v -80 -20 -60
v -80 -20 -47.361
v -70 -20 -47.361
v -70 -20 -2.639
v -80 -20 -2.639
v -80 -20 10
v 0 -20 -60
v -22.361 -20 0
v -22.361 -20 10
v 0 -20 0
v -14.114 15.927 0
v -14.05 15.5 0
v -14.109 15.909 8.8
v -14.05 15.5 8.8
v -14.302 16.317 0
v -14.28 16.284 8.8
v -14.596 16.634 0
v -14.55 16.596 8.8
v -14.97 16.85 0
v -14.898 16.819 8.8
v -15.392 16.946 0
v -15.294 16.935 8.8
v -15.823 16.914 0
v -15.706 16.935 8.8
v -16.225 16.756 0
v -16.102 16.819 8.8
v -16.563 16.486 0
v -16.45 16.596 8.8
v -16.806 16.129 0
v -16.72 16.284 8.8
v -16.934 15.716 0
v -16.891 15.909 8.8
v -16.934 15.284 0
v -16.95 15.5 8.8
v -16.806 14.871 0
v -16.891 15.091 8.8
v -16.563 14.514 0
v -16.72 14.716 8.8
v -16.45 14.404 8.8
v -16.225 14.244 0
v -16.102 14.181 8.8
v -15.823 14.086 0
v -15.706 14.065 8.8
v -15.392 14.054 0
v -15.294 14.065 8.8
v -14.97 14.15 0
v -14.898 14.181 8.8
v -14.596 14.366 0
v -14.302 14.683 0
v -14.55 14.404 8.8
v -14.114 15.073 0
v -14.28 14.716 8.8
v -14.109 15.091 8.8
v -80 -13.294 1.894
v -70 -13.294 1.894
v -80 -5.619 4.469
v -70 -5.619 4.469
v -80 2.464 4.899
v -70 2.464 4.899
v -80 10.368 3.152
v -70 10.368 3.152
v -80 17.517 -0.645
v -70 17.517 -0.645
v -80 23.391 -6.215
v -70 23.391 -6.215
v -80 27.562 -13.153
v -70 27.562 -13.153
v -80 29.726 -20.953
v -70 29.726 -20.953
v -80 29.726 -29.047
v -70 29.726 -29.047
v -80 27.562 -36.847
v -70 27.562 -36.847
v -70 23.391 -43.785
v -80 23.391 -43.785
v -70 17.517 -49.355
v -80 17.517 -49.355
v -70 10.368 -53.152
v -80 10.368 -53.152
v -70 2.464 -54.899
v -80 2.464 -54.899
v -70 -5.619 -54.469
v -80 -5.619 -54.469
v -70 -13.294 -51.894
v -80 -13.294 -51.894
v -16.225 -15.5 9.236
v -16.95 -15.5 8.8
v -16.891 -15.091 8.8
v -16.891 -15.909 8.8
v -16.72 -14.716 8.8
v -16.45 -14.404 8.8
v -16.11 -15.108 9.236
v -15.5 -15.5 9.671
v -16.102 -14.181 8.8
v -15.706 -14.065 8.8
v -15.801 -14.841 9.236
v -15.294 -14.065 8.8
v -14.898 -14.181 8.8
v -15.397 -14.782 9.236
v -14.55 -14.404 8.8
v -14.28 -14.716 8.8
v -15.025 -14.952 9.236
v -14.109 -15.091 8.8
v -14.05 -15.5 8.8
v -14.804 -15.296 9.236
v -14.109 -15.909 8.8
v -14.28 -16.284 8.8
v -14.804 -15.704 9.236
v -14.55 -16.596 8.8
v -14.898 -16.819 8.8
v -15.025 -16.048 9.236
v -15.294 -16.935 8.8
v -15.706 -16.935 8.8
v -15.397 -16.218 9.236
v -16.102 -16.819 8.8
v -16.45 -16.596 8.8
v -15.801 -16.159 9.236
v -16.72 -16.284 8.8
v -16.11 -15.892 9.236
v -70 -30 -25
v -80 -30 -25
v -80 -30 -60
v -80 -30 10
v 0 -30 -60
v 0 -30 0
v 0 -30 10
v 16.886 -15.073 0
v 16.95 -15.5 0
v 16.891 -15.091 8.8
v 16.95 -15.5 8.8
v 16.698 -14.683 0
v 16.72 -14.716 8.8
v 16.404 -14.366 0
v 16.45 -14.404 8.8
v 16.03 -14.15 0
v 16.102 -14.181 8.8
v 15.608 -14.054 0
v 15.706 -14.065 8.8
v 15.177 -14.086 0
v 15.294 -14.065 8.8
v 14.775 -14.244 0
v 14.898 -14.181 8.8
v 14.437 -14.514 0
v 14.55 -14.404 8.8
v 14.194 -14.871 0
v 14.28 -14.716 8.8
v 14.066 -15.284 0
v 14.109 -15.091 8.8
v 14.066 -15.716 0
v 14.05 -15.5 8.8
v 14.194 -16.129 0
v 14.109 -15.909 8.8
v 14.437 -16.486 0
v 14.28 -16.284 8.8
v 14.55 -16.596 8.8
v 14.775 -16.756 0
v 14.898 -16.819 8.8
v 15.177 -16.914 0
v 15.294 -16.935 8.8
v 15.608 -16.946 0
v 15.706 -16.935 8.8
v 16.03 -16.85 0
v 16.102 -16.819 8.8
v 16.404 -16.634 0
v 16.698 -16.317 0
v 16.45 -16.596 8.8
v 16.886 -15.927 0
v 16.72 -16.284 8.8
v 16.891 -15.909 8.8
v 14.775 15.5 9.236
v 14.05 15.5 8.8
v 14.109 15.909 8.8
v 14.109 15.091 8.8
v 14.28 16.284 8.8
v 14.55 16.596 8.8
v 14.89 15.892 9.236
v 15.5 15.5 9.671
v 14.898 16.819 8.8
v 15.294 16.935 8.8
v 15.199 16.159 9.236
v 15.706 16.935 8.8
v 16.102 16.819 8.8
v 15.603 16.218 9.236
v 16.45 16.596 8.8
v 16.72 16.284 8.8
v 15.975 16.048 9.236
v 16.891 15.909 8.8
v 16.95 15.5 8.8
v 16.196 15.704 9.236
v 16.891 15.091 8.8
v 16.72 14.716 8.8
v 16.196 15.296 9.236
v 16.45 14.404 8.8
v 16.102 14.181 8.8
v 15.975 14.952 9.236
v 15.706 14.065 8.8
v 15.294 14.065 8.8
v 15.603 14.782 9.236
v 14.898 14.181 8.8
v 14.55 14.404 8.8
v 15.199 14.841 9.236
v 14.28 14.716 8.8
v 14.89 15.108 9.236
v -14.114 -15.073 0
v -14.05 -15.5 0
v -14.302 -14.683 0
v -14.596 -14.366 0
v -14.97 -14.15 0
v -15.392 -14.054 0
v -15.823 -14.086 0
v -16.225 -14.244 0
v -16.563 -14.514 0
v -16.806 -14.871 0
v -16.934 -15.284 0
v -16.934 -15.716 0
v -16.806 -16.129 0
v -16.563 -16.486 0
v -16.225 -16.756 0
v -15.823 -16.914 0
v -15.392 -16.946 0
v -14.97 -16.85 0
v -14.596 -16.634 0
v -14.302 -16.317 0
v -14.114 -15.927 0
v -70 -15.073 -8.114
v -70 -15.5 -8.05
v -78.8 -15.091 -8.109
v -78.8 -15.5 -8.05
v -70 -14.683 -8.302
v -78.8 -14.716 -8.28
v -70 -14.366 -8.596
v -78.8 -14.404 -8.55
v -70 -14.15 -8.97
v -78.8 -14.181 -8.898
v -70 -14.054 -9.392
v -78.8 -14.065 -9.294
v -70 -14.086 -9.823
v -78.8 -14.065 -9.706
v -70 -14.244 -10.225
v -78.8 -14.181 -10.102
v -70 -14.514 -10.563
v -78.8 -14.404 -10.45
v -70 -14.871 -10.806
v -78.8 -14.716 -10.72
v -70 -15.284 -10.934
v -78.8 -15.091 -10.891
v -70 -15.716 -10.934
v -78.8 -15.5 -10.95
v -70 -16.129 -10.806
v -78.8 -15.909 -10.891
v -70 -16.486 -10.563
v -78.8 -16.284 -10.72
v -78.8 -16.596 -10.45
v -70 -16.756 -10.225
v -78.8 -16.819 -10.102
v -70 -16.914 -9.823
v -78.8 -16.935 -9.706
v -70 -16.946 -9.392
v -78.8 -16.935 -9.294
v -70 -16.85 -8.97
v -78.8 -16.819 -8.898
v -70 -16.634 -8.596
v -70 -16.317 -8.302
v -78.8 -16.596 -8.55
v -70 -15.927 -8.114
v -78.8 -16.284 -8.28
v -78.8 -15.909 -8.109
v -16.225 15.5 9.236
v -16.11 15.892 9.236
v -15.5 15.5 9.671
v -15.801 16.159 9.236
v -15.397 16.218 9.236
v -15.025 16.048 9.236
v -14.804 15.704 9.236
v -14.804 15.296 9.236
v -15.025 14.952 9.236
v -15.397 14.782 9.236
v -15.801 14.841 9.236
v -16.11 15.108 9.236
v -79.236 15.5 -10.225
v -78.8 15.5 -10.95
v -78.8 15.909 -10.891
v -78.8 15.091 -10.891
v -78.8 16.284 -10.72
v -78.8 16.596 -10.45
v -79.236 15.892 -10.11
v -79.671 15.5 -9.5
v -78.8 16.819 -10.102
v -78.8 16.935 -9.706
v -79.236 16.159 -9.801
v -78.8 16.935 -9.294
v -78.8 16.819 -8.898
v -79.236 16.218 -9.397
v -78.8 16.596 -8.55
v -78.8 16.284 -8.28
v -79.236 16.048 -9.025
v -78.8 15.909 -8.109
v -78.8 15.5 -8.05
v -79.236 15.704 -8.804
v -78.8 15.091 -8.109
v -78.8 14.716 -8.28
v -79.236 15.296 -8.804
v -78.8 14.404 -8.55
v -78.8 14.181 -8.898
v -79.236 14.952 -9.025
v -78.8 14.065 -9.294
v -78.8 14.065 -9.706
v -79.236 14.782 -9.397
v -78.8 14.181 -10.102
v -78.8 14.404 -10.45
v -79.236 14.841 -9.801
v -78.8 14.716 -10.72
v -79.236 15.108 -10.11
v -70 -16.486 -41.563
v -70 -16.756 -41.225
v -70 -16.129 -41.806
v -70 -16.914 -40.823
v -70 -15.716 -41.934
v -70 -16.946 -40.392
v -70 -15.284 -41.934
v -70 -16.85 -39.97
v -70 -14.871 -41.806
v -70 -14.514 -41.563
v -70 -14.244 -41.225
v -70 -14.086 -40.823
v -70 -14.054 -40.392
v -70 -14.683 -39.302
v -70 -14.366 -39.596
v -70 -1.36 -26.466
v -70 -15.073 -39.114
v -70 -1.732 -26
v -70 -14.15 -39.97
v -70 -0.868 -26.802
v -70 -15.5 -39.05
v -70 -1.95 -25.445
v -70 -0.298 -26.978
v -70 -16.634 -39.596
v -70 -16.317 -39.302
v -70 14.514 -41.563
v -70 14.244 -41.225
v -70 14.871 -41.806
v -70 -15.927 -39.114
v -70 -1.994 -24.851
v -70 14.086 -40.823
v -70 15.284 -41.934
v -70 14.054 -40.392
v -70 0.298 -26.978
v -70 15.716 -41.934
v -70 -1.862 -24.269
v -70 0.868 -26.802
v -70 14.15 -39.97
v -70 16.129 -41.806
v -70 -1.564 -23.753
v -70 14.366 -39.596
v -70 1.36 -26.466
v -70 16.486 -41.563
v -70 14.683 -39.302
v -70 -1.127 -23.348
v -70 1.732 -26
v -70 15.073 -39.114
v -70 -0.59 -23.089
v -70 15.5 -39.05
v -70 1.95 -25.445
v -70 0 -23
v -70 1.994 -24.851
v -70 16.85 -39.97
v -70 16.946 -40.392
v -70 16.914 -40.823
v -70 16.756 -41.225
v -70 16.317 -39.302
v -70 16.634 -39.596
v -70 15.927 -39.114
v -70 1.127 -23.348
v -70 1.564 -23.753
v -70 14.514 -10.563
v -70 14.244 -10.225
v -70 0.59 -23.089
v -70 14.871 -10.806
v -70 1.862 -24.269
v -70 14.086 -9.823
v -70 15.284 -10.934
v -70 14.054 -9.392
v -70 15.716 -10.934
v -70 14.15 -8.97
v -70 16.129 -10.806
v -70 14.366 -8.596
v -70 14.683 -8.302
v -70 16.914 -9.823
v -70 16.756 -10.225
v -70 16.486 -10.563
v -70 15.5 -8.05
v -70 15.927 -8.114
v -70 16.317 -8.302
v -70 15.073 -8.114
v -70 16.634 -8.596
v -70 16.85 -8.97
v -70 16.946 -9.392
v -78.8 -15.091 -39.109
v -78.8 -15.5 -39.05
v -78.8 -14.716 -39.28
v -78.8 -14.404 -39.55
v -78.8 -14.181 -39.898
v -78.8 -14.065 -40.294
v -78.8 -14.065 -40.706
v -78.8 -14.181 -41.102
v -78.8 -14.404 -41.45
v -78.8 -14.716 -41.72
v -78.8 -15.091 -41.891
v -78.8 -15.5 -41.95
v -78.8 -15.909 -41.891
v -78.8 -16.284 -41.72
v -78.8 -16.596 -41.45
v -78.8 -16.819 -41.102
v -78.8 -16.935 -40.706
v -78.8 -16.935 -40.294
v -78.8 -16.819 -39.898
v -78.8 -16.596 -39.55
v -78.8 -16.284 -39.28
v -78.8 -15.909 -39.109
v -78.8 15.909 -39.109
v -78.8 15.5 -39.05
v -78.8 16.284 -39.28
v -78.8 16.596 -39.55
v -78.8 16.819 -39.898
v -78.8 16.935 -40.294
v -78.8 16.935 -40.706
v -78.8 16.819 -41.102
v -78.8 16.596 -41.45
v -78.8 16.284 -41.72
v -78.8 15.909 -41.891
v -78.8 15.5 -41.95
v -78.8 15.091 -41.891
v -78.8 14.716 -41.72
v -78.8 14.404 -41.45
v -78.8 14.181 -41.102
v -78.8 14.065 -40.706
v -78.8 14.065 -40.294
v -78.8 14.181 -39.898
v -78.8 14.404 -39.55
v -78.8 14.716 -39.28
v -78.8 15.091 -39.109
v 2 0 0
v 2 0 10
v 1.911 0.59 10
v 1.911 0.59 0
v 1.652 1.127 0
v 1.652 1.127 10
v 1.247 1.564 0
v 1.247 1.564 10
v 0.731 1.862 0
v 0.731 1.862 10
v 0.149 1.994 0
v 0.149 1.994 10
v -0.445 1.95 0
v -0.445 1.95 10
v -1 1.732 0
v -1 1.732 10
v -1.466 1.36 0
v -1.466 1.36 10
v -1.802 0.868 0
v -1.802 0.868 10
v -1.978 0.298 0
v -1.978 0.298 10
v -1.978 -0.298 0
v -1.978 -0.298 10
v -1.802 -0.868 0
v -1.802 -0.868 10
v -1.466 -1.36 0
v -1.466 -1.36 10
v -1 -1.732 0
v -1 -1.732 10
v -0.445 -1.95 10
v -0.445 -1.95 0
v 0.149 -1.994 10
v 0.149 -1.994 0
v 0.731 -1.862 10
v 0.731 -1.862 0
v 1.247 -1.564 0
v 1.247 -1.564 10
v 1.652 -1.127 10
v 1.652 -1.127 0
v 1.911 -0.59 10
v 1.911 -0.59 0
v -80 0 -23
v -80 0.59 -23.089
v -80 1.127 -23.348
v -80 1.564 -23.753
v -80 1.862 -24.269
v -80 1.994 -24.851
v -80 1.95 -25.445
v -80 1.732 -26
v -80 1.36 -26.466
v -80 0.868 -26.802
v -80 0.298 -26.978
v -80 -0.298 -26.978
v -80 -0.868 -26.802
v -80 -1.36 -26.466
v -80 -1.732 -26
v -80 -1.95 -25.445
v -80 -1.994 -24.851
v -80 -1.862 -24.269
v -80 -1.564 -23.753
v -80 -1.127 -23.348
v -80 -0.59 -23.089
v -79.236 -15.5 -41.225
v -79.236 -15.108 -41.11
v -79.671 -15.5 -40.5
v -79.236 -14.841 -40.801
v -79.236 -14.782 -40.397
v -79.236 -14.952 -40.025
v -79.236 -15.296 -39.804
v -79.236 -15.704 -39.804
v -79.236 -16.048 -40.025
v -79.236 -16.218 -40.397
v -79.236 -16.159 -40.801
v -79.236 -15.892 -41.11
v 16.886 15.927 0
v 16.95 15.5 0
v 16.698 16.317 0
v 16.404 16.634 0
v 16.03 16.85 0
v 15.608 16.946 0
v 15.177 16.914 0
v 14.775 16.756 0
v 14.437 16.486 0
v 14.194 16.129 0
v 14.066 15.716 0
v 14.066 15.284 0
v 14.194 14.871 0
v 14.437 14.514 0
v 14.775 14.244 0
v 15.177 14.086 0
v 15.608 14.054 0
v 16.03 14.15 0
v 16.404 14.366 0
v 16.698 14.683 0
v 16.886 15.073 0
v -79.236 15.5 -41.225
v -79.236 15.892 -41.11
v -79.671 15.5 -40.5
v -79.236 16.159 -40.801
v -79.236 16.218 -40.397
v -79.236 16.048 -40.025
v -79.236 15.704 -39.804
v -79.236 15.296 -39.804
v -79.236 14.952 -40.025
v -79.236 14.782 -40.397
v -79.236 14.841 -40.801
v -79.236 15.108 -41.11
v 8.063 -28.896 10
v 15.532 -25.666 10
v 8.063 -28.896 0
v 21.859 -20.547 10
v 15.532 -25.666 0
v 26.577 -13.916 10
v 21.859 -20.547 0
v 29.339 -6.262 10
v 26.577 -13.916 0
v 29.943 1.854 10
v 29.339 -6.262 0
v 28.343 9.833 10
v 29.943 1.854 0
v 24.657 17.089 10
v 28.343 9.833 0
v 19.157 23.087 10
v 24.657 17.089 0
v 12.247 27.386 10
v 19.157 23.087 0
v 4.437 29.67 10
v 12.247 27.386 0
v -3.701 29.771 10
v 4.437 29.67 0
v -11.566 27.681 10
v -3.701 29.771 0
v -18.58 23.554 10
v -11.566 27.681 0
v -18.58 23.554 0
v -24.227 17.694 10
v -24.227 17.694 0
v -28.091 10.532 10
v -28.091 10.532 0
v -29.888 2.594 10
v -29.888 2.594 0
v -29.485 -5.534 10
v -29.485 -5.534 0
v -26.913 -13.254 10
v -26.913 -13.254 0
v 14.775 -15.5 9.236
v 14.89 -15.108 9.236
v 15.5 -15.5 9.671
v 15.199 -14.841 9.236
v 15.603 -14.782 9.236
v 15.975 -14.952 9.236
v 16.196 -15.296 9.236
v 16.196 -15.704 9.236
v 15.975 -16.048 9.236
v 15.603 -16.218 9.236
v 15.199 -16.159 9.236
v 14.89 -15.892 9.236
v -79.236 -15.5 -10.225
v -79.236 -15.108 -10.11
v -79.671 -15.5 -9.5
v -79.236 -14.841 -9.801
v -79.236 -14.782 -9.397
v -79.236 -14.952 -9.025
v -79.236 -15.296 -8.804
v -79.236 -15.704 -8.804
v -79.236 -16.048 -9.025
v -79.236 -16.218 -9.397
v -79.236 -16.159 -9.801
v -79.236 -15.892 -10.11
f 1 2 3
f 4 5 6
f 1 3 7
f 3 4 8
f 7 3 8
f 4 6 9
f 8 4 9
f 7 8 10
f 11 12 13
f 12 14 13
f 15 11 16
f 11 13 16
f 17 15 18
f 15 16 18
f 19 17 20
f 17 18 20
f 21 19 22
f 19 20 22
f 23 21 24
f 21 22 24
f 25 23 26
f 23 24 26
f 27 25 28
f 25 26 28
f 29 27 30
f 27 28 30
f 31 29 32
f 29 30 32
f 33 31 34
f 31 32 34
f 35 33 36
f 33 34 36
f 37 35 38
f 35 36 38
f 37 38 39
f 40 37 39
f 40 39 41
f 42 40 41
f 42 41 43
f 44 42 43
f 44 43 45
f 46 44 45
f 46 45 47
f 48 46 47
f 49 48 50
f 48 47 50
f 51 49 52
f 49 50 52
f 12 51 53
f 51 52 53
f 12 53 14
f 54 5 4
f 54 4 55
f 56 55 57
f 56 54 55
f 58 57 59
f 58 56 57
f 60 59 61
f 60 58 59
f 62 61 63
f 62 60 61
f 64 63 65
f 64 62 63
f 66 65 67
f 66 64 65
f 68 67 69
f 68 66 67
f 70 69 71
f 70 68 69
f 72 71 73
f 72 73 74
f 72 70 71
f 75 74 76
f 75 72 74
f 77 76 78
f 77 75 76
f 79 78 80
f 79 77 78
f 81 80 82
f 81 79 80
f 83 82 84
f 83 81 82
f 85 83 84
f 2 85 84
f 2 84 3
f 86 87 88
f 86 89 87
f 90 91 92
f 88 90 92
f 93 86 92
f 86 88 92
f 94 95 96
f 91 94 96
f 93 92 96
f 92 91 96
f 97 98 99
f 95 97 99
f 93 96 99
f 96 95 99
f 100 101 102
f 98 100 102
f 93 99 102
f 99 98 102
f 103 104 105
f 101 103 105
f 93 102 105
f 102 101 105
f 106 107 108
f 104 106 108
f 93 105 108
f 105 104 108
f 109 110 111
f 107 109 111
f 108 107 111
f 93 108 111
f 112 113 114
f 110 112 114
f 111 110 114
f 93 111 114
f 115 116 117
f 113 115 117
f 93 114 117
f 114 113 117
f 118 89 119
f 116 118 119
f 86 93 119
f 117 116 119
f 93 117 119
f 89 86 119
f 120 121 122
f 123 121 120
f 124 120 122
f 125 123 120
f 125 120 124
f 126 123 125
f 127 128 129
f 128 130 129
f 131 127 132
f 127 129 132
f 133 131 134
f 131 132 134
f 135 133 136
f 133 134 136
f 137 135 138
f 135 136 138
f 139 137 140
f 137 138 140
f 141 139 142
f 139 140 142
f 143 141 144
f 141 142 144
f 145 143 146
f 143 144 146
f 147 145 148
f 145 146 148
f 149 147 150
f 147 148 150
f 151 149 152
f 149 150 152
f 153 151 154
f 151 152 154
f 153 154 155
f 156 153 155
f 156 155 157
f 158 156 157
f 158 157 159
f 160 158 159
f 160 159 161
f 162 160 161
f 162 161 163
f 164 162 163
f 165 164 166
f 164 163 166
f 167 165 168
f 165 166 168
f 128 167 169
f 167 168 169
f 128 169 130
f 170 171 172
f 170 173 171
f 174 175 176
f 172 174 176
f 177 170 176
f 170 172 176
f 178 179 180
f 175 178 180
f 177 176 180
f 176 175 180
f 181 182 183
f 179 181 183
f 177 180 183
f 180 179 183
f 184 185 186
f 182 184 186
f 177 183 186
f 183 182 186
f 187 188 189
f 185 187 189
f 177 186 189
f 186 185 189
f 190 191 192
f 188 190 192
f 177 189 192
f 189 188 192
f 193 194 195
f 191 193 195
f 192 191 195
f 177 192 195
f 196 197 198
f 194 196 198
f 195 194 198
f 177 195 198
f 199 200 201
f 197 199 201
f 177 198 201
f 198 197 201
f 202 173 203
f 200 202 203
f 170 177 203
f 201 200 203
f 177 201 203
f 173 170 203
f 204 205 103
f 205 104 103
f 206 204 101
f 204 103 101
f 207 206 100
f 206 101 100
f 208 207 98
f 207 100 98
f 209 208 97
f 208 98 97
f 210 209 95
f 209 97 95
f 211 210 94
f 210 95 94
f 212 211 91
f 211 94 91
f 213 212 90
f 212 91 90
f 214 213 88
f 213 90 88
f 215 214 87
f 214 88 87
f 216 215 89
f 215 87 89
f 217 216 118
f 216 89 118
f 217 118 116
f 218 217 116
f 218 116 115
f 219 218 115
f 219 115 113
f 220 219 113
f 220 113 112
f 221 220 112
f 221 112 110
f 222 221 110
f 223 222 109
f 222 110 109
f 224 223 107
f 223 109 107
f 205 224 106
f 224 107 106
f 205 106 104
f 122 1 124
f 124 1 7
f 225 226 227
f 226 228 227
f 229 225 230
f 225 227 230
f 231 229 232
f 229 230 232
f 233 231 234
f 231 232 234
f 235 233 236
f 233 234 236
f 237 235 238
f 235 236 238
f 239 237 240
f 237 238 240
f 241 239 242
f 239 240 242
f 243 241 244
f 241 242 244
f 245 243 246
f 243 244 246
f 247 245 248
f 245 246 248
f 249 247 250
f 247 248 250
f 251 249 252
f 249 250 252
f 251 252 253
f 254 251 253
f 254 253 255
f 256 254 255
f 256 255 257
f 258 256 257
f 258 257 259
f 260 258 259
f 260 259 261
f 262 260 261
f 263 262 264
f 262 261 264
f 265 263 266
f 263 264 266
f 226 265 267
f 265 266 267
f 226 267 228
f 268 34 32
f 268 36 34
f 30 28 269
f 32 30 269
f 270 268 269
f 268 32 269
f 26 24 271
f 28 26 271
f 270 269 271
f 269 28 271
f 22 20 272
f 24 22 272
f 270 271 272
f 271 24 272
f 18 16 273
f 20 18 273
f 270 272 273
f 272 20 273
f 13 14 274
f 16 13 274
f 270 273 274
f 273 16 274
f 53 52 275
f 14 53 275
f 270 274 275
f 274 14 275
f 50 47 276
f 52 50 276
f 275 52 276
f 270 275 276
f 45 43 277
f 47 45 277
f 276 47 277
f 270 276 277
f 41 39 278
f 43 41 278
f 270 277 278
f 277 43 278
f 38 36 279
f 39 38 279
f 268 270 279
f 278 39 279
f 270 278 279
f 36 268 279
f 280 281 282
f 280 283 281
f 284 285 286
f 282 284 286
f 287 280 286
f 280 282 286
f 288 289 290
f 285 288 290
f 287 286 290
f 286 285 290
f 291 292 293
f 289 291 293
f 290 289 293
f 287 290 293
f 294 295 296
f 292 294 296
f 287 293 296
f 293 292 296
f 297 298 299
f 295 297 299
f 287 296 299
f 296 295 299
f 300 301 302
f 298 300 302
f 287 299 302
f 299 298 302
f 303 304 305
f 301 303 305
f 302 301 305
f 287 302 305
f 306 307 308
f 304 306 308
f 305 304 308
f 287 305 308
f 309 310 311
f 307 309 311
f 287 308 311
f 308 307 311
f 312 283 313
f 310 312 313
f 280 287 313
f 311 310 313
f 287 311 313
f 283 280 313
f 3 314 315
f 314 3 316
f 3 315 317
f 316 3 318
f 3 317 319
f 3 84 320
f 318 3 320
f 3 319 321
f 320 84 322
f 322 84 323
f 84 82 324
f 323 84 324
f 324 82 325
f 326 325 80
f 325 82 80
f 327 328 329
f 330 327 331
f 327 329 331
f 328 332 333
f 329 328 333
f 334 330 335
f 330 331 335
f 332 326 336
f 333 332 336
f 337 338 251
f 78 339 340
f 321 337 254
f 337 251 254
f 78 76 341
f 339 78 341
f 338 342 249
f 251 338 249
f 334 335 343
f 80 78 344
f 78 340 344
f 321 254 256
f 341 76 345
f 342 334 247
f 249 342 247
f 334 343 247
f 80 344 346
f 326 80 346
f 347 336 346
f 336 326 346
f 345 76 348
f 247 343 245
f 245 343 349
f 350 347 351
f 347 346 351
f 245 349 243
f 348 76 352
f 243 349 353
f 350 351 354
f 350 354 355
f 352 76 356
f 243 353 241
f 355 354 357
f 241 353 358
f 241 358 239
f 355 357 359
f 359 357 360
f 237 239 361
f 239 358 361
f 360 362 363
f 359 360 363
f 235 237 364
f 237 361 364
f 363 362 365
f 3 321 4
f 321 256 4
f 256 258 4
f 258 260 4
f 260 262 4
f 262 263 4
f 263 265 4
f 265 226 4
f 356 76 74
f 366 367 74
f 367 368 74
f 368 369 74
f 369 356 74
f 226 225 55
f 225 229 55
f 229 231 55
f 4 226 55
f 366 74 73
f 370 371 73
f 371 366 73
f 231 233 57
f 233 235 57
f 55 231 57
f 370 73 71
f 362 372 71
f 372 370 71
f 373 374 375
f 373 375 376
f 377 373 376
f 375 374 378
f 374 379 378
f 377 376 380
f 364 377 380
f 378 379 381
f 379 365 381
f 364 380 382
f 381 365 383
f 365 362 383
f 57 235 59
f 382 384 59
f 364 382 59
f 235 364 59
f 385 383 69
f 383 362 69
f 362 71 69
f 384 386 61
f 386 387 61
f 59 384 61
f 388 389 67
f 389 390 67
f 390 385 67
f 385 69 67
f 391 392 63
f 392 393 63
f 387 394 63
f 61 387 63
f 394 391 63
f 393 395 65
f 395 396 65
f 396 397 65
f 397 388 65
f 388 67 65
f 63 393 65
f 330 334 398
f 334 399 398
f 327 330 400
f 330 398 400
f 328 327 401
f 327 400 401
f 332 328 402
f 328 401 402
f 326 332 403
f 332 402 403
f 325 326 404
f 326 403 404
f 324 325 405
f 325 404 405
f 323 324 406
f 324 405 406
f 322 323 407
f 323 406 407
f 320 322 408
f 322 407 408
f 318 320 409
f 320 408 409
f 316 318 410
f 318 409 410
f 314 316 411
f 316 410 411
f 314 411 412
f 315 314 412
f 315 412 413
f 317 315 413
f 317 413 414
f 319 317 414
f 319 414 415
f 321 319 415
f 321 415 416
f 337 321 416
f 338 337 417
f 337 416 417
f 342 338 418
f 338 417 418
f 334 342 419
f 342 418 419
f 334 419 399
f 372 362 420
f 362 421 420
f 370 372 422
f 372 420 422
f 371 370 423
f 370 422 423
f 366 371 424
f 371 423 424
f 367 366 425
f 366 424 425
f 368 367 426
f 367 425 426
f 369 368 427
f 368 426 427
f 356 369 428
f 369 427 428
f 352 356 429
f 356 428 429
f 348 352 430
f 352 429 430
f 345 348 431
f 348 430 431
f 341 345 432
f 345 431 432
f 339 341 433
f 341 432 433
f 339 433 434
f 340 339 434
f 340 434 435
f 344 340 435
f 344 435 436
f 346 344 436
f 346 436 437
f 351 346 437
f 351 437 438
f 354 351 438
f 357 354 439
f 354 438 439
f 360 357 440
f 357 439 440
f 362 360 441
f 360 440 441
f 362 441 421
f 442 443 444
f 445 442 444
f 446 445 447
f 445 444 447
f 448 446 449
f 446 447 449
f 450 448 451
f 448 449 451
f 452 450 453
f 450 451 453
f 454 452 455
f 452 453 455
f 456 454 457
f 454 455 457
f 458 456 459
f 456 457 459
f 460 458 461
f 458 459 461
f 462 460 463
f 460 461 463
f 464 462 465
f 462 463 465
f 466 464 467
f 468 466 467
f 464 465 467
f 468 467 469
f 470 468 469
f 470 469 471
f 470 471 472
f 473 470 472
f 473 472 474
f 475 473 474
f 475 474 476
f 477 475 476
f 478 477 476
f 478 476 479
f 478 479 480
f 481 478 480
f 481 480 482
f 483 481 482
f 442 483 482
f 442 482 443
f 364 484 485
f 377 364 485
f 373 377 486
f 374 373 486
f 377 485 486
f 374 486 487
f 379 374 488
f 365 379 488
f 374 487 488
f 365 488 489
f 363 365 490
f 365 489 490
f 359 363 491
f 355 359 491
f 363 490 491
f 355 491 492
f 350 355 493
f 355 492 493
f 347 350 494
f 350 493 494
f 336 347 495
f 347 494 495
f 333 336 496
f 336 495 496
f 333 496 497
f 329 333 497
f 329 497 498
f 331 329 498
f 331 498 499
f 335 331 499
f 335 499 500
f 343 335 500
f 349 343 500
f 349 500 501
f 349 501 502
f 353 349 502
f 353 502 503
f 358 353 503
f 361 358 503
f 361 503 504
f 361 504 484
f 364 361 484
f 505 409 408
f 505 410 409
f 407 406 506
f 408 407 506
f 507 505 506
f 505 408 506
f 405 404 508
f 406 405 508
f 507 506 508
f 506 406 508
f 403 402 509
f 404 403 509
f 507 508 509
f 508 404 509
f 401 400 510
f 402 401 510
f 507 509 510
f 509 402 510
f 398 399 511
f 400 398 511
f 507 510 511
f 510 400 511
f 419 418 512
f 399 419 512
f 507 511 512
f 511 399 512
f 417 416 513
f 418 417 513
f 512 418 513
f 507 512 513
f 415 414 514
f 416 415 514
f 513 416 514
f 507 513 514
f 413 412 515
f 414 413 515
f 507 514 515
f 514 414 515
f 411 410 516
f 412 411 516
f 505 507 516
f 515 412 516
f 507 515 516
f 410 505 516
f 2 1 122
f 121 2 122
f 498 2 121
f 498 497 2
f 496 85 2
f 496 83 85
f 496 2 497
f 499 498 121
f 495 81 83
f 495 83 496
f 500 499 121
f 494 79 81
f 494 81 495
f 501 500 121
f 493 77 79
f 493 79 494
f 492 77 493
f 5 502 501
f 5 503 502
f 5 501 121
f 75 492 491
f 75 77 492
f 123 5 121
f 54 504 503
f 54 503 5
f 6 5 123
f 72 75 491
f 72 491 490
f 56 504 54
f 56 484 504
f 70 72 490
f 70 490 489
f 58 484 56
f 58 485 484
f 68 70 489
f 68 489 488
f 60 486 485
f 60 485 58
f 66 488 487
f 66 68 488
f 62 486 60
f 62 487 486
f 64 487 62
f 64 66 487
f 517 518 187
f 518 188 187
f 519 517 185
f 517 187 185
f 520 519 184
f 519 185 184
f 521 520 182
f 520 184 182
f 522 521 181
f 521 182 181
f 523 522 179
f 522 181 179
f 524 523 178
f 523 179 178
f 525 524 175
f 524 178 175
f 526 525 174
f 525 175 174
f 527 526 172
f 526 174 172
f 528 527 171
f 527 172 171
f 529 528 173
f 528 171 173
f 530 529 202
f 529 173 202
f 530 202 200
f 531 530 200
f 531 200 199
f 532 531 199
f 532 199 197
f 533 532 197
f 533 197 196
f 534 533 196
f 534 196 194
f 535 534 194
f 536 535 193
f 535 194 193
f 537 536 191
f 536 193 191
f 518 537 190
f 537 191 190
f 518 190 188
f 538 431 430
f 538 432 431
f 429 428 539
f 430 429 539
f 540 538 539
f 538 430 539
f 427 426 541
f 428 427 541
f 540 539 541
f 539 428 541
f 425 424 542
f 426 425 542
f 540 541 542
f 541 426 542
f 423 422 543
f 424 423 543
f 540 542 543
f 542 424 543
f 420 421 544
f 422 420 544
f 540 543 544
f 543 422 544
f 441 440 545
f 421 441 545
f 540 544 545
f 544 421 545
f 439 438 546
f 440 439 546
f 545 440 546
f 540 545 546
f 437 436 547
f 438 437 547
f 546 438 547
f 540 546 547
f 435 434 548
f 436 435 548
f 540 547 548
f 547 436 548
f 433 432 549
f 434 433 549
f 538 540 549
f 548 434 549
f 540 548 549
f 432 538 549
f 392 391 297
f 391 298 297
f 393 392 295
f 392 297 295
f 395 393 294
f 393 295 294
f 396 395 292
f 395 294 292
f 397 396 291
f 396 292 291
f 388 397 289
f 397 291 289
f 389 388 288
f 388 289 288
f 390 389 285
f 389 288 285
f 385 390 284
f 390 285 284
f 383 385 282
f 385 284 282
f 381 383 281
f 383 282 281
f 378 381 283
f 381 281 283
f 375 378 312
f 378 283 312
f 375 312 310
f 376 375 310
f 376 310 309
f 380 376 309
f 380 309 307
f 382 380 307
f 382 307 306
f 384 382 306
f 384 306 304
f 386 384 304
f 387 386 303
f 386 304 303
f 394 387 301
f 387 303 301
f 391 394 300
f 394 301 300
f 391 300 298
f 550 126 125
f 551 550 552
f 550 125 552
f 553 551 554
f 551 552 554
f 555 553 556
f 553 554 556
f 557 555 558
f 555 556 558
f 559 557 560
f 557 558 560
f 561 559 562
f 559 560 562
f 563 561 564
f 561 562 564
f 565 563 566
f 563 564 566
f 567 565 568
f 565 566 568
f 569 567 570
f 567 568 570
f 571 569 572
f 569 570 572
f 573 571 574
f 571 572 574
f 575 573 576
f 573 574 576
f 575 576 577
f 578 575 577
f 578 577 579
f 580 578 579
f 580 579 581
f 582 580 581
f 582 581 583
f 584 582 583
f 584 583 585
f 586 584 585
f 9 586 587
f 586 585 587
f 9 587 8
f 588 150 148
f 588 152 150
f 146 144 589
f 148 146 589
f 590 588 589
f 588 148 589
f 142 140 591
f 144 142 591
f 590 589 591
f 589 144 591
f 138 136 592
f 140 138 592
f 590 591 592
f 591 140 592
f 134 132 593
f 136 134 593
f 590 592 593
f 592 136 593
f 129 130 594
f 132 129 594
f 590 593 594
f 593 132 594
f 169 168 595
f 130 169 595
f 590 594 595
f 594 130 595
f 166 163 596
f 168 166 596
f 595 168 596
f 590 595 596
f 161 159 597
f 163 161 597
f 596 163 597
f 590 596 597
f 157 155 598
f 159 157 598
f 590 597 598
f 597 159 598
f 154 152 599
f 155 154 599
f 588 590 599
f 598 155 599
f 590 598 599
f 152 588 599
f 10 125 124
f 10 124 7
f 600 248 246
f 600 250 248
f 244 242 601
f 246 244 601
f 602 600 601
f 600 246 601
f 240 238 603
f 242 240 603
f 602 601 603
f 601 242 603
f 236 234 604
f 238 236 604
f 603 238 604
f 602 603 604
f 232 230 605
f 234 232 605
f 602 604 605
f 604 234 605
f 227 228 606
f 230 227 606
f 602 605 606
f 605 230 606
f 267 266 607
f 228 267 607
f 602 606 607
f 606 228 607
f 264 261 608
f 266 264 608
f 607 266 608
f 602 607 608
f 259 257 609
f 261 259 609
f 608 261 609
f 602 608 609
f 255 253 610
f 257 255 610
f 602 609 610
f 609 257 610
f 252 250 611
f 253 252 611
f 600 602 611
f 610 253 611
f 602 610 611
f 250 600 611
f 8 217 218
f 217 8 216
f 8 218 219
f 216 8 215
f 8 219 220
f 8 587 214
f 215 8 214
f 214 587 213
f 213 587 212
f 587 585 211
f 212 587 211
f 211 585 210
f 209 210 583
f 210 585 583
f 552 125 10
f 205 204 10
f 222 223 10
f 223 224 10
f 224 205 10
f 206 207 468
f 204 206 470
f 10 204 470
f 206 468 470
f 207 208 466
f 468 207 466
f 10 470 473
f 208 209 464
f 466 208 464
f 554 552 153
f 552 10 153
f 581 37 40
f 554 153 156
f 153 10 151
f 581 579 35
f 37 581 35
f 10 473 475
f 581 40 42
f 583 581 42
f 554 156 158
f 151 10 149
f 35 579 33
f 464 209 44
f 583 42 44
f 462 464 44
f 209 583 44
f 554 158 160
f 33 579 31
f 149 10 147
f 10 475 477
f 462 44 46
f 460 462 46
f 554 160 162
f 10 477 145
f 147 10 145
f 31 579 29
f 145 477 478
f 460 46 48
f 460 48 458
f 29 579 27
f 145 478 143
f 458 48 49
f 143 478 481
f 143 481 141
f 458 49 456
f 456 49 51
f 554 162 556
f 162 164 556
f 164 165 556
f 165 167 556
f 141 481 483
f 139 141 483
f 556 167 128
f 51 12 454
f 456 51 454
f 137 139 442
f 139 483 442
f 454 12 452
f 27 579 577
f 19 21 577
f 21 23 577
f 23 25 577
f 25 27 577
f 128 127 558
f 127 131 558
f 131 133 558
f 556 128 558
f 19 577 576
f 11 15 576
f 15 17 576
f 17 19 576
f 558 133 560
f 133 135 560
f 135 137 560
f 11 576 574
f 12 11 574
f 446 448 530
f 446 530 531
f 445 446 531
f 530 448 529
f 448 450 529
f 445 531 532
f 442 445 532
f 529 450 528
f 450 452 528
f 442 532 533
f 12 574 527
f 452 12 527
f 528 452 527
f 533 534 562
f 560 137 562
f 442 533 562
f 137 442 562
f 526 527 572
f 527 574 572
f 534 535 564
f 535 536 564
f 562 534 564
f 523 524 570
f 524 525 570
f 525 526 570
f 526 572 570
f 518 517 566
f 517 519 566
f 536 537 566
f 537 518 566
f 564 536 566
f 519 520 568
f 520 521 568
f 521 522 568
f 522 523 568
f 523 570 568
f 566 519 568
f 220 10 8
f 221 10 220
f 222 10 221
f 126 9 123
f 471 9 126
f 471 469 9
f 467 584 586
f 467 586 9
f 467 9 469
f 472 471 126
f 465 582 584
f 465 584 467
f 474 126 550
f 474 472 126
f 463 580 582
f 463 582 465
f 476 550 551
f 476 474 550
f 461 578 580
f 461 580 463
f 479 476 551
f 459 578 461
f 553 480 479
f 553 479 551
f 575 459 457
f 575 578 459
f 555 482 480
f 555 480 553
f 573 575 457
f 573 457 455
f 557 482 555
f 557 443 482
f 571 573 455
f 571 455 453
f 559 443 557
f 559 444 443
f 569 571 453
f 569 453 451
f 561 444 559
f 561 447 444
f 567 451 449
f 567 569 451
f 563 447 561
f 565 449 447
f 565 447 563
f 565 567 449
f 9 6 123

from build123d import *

# Parameters (mm, degrees)
SKETCH1_R                   = 30
BOSS_EXTRUDE1_DEPTH         = 10
SKETCH2_W                   = 80
SKETCH2_H                   = 10
BOSS_EXTRUDE2_DEPTH         = 70
SKETCH3_R                   = 30
BOSS_EXTRUDE3_DEPTH         = 10
F_4_0MM_DOWEL_HOLE1_D       = 4
F_4_0MM_DOWEL_HOLE1_DEPTH   = 10.1
F_4_0MM_DOWEL_HOLE1_TIP     = 1.201721238
M3_5X0_6_TAPPED_HOLE1_D     = 2.9
M3_5X0_6_TAPPED_HOLE1_DEPTH = 8.8
M3_5X0_6_TAPPED_HOLE1_TIP   = 0.871247898
F_4_0MM_DOWEL_HOLE5_D       = 4
F_4_0MM_DOWEL_HOLE5_DEPTH   = 10.1
F_4_0MM_DOWEL_HOLE5_TIP     = 1.201721238
M3_5X0_6_TAPPED_HOLE4_D     = 2.9
M3_5X0_6_TAPPED_HOLE4_DEPTH = 8.8
M3_5X0_6_TAPPED_HOLE4_TIP   = 0.871247898


with BuildPart() as part:
    # Sketch1 → Boss-Extrude1 (new body)
    with BuildSketch(Plane.XY):
        Circle(SKETCH1_R)
    extrude(amount=BOSS_EXTRUDE1_DEPTH)

    # Sketch2 → Boss-Extrude2 (add)
    with BuildSketch(Plane.XY.offset(10)):
        with Locations((-40, -25)):
            Rectangle(SKETCH2_W, SKETCH2_H)
    extrude(amount=-BOSS_EXTRUDE2_DEPTH)

    # Sketch3 → Boss-Extrude3 (add)
    with BuildSketch(Plane.ZY.offset(80)):
        with Locations((-25, 0)):
            Circle(SKETCH3_R)
    extrude(amount=-BOSS_EXTRUDE3_DEPTH)

    # Ø4.0mm Dowel Hole1
    with Locations(Plane(origin=(0, 0, 0), x_dir=(-1, 0, 0), z_dir=(0, 0, -1))):
        with Locations((0, 0)):
            Hole(F_4_0MM_DOWEL_HOLE1_D / 2, depth=F_4_0MM_DOWEL_HOLE1_DEPTH)
            with Locations((0, 0, -(F_4_0MM_DOWEL_HOLE1_DEPTH + F_4_0MM_DOWEL_HOLE1_TIP / 2))):  # 118° drill point
                Cone(0, F_4_0MM_DOWEL_HOLE1_D / 2, F_4_0MM_DOWEL_HOLE1_TIP, mode=Mode.SUBTRACT)

    # M3.5x0.6 Tapped Hole1
    with Locations(Plane(origin=(0, 0, 0), x_dir=(-1, 0, 0), z_dir=(0, 0, -1))):
        with Locations((-15.5, 15.5), (15.5, 15.5), (15.5, -15.5), (-15.5, -15.5)):
            Hole(M3_5X0_6_TAPPED_HOLE1_D / 2, depth=M3_5X0_6_TAPPED_HOLE1_DEPTH)
            with Locations((0, 0, -(M3_5X0_6_TAPPED_HOLE1_DEPTH + M3_5X0_6_TAPPED_HOLE1_TIP / 2))):  # 118° drill point
                Cone(0, M3_5X0_6_TAPPED_HOLE1_D / 2, M3_5X0_6_TAPPED_HOLE1_TIP, mode=Mode.SUBTRACT)

    # Ø4.0mm Dowel Hole5
    with Locations(Plane(origin=(-70, 13.498610341, 45.984792648), x_dir=(0, 0, -1), z_dir=(1, 0, 0))):
        with Locations((70.984792648, -13.498610341)):
            Hole(F_4_0MM_DOWEL_HOLE5_D / 2, depth=F_4_0MM_DOWEL_HOLE5_DEPTH)
            with Locations((0, 0, -(F_4_0MM_DOWEL_HOLE5_DEPTH + F_4_0MM_DOWEL_HOLE5_TIP / 2))):  # 118° drill point
                Cone(0, F_4_0MM_DOWEL_HOLE5_D / 2, F_4_0MM_DOWEL_HOLE5_TIP, mode=Mode.SUBTRACT)

    # M3.5x0.6 Tapped Hole4
    with Locations(Plane(origin=(-70, 0.743323111, -25.05678535), x_dir=(0, 0, -1), z_dir=(1, 0, 0))):
        with Locations((-15.55678535, 14.756676889), (15.44321465, 14.756676889), (15.44321465, -16.243323111), (-15.55678535, -16.243323111)):
            Hole(M3_5X0_6_TAPPED_HOLE4_D / 2, depth=M3_5X0_6_TAPPED_HOLE4_DEPTH)
            with Locations((0, 0, -(M3_5X0_6_TAPPED_HOLE4_DEPTH + M3_5X0_6_TAPPED_HOLE4_TIP / 2))):  # 118° drill point
                Cone(0, M3_5X0_6_TAPPED_HOLE4_D / 2, M3_5X0_6_TAPPED_HOLE4_TIP, mode=Mode.SUBTRACT)


solid = part.part
